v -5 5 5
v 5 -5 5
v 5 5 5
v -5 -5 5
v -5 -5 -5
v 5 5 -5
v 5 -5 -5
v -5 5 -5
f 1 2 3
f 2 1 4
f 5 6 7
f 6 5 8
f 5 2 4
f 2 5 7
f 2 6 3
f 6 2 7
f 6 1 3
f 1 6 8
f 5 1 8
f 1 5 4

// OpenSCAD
tr_x = 0; // [-180:10:180]
tr_y = 0; // [-180:10:180]
tr_z = 0; // [-180:10:180]
rot_x = 0; // [-180:15:180]
rot_y = 0; // [-180:15:180]
rot_z = 0;  // [-180:15:180]

translate( [tr_x,tr_y,tr_z] ) 
rotate( [rot_x,rot_y,rot_z] ) 
cube(10,true);
